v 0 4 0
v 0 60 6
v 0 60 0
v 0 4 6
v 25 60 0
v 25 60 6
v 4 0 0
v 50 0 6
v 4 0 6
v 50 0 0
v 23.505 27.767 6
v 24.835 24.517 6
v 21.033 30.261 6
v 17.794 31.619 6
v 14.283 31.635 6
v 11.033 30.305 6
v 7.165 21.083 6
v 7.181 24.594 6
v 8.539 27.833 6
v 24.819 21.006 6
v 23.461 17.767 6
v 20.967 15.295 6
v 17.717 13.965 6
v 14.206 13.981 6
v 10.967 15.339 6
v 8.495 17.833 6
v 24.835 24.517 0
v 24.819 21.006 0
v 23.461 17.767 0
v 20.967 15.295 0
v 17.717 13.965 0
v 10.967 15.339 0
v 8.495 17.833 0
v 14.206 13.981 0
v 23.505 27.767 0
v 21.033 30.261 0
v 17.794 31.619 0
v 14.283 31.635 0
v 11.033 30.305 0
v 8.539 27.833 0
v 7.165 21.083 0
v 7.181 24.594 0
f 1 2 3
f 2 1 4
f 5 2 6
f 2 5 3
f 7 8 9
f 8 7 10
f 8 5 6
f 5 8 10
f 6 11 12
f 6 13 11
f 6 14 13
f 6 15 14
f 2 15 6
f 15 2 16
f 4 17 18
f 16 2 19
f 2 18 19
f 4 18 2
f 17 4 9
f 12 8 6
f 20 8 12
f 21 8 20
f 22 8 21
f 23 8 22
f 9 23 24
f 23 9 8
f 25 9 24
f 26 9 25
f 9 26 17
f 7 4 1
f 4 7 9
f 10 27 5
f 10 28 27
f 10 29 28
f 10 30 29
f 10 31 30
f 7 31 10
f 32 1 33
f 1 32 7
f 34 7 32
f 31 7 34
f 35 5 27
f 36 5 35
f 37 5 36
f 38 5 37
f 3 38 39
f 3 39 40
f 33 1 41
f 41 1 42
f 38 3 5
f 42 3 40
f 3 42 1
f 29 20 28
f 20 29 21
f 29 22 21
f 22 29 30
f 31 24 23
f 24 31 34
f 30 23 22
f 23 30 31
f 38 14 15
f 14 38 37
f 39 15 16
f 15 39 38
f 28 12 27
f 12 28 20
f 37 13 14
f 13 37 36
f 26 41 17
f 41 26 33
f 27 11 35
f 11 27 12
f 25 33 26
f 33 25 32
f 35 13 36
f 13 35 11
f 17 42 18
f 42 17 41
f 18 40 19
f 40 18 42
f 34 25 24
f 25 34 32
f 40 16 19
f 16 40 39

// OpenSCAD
$fn = 32;

// ----------------------------------------------------------------------
// Bracket plate: gusset 50 x 60
// ----------------------------------------------------------------------

// --- parameters (mm) ---
hole_r = 3;               // bolt hole radius
plate_t = 6;              // plate thickness, Z (extrusion height)
gus_a = 50;               // base length
gus_b = 60;               // height
top_x = 25;               // top edge X of the angled cut
light_r = 9;              // lightening hole radius
fit_tol = 0.1;            // declared fit tolerance (prompt contract)
free_tol = 0.3;           // declared free tolerance (prompt contract)

light_d = 2 * light_r;

profile = [[4, 0], [25, 0], [50, 0], [25, 60], [0, 60], [0, 4]];  // primary outline, 6 points, counter clockwise
void_1 = [[24.835, 24.517], [23.505, 27.767], [21.033, 30.261], [17.794, 31.619], [14.283, 31.635], [11.033, 30.305], [8.539, 27.833], [7.181, 24.594], [7.165, 21.083], [8.495, 17.833], [10.967, 15.339], [14.206, 13.981], [17.717, 13.965], [20.967, 15.295], [23.461, 17.767], [24.819, 21.006]];  // lightening hole, 16 points

// --- the one profile operation ---
difference() {
  linear_extrude(height = plate_t) polygon(points = profile);
  translate([0, 0, -1])
    linear_extrude(height = plate_t + 2) polygon(points = void_1);
}
